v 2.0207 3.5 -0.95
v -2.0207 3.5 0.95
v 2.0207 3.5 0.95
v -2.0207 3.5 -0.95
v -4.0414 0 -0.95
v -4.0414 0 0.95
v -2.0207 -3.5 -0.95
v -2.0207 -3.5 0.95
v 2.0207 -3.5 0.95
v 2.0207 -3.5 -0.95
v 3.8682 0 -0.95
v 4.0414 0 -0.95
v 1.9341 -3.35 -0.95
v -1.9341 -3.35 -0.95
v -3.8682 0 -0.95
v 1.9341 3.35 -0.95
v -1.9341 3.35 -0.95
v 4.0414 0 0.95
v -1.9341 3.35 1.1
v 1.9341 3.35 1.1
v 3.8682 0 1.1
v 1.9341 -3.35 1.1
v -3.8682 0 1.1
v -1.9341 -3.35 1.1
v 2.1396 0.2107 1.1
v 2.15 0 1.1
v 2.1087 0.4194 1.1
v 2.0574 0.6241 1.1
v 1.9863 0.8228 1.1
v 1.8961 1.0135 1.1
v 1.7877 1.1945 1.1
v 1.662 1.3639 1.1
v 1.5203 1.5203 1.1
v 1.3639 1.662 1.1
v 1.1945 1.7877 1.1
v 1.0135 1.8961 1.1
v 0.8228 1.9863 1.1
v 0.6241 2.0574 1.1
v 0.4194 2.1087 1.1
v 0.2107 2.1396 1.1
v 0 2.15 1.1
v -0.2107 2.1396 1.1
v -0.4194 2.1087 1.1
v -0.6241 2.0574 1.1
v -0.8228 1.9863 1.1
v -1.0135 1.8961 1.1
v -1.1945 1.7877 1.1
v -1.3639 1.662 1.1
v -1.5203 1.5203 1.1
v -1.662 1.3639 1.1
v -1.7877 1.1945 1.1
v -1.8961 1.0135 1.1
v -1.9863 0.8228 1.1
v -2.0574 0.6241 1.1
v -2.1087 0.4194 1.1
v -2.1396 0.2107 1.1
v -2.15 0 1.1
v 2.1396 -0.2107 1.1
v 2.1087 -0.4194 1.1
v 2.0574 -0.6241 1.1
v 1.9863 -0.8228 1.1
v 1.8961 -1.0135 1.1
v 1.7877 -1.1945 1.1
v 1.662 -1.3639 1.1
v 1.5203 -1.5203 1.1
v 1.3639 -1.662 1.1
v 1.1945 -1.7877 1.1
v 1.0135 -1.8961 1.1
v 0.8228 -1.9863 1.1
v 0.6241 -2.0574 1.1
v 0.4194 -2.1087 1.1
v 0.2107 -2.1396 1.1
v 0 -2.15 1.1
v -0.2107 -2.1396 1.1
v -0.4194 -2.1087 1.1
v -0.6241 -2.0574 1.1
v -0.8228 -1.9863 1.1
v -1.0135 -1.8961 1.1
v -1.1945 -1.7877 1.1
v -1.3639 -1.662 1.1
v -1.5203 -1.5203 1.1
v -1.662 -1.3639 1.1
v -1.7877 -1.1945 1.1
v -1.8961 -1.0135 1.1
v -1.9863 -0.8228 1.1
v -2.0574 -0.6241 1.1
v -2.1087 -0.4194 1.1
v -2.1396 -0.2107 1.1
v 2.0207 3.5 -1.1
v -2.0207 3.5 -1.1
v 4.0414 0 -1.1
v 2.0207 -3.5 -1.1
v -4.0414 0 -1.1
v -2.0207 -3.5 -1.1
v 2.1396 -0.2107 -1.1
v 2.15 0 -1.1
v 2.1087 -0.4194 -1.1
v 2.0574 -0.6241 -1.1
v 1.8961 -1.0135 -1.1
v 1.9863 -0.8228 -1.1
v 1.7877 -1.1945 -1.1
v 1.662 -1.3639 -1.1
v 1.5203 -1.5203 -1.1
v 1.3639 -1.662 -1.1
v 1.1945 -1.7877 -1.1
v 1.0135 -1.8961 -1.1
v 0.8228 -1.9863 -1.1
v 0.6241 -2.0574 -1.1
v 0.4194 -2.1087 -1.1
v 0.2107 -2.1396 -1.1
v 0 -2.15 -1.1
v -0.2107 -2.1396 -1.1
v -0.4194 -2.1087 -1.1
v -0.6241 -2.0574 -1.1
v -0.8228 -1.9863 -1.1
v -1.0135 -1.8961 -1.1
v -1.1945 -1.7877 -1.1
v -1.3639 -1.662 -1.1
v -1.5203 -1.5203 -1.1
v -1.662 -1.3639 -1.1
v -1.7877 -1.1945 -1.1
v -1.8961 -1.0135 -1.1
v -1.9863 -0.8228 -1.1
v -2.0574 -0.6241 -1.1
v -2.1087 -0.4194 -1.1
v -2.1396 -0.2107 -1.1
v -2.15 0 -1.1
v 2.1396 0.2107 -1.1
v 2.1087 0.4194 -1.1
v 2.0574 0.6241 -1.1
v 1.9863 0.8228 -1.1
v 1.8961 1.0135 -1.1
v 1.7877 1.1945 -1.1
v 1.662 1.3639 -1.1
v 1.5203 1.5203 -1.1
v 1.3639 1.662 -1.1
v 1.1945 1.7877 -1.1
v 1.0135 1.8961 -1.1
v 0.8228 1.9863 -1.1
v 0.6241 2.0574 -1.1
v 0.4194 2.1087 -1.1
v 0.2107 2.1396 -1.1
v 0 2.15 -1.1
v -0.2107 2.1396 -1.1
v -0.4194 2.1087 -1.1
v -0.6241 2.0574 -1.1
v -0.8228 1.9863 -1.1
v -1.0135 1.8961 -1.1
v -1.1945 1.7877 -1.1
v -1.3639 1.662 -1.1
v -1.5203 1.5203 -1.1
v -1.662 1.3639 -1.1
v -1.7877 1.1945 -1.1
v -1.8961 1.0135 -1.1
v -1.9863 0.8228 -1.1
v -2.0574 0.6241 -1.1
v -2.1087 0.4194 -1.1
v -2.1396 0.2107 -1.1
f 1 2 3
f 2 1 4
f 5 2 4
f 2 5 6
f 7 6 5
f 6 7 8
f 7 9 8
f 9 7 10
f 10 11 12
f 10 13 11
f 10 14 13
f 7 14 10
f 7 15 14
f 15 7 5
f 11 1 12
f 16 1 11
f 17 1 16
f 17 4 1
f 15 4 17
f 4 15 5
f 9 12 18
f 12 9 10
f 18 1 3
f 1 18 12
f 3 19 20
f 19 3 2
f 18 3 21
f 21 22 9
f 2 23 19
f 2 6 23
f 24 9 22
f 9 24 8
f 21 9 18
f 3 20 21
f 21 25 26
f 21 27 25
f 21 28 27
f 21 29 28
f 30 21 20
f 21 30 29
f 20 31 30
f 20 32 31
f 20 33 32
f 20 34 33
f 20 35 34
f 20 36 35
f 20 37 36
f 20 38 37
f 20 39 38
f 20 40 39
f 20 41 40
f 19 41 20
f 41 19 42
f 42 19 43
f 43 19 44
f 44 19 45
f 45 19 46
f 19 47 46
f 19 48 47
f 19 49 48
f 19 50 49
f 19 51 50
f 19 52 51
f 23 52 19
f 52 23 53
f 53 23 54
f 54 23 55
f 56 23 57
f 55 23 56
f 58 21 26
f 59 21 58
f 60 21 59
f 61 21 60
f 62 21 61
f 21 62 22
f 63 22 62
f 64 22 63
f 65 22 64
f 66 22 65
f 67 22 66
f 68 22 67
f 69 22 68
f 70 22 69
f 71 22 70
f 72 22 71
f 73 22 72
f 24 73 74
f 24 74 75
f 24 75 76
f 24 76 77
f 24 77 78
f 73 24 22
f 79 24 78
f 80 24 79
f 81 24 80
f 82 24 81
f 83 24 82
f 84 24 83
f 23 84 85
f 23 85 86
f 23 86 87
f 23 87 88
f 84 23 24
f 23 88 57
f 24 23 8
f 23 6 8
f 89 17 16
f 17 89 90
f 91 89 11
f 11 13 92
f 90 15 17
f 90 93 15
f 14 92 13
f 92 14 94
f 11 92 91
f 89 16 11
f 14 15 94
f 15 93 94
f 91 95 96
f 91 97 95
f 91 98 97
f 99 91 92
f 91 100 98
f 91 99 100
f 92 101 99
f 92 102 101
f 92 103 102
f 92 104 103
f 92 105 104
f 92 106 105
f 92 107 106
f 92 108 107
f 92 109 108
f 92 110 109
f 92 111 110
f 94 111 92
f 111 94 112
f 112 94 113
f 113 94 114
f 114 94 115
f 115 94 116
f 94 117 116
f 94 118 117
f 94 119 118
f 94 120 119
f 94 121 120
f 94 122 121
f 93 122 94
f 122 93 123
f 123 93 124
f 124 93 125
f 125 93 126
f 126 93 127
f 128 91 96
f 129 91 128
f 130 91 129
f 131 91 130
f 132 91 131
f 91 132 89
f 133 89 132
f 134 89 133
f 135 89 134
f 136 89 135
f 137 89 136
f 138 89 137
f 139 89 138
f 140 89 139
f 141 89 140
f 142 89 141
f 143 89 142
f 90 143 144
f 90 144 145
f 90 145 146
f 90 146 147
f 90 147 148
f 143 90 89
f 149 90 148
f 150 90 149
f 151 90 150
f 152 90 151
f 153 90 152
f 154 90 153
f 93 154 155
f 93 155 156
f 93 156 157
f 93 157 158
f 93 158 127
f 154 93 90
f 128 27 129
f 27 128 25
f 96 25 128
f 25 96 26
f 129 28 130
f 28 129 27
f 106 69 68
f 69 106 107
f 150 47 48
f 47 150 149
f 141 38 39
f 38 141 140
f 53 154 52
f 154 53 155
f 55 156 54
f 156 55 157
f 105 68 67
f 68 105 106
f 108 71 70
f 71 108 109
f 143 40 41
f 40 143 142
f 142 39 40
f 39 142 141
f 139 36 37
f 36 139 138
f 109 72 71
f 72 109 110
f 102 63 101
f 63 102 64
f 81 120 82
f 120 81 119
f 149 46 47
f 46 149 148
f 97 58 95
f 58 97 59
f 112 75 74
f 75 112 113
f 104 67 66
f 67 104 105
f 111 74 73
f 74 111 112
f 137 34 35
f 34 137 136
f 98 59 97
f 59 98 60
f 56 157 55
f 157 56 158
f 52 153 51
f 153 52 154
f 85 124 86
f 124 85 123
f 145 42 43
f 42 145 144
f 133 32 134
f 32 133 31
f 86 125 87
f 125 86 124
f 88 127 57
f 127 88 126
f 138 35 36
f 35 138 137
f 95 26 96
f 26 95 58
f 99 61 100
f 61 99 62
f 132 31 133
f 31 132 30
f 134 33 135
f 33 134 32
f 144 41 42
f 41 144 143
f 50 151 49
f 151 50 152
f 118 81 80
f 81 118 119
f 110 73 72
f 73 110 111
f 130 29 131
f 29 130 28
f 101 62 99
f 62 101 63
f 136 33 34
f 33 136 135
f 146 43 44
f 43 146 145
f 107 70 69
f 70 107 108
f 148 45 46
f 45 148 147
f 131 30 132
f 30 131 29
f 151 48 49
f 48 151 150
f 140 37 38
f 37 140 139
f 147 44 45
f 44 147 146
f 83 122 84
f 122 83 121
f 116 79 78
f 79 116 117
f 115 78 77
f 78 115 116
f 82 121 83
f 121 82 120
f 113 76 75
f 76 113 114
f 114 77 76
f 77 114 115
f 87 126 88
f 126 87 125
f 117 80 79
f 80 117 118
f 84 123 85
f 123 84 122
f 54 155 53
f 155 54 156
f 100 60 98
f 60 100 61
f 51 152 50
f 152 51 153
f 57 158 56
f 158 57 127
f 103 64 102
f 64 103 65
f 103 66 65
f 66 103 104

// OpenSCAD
// Thin hex nut for 4.0mm screws: 7.0mm across flats, 2.2mm thick
// One connected solid (nut only), true hex across flats, clean geometry.

// Parameters
thread_nominal_diameter_mm = 4.0;   // screw size (nominal)
across_flats_mm            = 7.0;   // hex across flats
thickness_mm               = 2.2;   // nut thickness

// Hole (choose a sensible default for M4 clearance; adjust if you want tapped/minor)
hole_diameter_mm           = 4.3;   // clearance for M4 (typical)

// Small edge break (kept subtle to avoid artifacts)
chamfer_mm                 = 0.15;  // small chamfer on both faces

eps_mm                     = 0.02;  // numerical epsilon

// Derived: for a regular hex, across_flats = 2 * apothem.
// OpenSCAD cylinder(r=..., $fn=6) uses r as circumradius.
// circumradius = apothem / cos(30) = (across_flats/2) / cos(30)
hex_R = (across_flats_mm/2) / cos(30);

// 2D hex profile with exact across-flats
module hex2d(af) {
    R = (af/2) / cos(30);
    polygon(points=[for (i=[0:5]) [R*cos(60*i), R*sin(60*i)]]);
}

module thin_hex_nut() {
    difference() {
        // Outer body with small chamfers (no rounding of flats)
        union() {
            // Middle prismatic section
            linear_extrude(height = max(thickness_mm - 2*chamfer_mm, 0), center=true)
                hex2d(across_flats_mm);

            // Top chamfer (tapers inward)
            if (chamfer_mm > 0)
                translate([0,0, (thickness_mm/2) - chamfer_mm/2])
                    linear_extrude(height=chamfer_mm, center=true, scale=(across_flats_mm - 2*chamfer_mm)/across_flats_mm)
                        hex2d(across_flats_mm);

            // Bottom chamfer (tapers inward)
            if (chamfer_mm > 0)
                translate([0,0, -(thickness_mm/2) + chamfer_mm/2])
                    linear_extrude(height=chamfer_mm, center=true, scale=(across_flats_mm - 2*chamfer_mm)/across_flats_mm)
                        hex2d(across_flats_mm);
        }

        // Through hole
        cylinder(d=hole_diameter_mm, h=thickness_mm + 2*eps_mm, center=true, $fn=64);
    }
}

thin_hex_nut();
